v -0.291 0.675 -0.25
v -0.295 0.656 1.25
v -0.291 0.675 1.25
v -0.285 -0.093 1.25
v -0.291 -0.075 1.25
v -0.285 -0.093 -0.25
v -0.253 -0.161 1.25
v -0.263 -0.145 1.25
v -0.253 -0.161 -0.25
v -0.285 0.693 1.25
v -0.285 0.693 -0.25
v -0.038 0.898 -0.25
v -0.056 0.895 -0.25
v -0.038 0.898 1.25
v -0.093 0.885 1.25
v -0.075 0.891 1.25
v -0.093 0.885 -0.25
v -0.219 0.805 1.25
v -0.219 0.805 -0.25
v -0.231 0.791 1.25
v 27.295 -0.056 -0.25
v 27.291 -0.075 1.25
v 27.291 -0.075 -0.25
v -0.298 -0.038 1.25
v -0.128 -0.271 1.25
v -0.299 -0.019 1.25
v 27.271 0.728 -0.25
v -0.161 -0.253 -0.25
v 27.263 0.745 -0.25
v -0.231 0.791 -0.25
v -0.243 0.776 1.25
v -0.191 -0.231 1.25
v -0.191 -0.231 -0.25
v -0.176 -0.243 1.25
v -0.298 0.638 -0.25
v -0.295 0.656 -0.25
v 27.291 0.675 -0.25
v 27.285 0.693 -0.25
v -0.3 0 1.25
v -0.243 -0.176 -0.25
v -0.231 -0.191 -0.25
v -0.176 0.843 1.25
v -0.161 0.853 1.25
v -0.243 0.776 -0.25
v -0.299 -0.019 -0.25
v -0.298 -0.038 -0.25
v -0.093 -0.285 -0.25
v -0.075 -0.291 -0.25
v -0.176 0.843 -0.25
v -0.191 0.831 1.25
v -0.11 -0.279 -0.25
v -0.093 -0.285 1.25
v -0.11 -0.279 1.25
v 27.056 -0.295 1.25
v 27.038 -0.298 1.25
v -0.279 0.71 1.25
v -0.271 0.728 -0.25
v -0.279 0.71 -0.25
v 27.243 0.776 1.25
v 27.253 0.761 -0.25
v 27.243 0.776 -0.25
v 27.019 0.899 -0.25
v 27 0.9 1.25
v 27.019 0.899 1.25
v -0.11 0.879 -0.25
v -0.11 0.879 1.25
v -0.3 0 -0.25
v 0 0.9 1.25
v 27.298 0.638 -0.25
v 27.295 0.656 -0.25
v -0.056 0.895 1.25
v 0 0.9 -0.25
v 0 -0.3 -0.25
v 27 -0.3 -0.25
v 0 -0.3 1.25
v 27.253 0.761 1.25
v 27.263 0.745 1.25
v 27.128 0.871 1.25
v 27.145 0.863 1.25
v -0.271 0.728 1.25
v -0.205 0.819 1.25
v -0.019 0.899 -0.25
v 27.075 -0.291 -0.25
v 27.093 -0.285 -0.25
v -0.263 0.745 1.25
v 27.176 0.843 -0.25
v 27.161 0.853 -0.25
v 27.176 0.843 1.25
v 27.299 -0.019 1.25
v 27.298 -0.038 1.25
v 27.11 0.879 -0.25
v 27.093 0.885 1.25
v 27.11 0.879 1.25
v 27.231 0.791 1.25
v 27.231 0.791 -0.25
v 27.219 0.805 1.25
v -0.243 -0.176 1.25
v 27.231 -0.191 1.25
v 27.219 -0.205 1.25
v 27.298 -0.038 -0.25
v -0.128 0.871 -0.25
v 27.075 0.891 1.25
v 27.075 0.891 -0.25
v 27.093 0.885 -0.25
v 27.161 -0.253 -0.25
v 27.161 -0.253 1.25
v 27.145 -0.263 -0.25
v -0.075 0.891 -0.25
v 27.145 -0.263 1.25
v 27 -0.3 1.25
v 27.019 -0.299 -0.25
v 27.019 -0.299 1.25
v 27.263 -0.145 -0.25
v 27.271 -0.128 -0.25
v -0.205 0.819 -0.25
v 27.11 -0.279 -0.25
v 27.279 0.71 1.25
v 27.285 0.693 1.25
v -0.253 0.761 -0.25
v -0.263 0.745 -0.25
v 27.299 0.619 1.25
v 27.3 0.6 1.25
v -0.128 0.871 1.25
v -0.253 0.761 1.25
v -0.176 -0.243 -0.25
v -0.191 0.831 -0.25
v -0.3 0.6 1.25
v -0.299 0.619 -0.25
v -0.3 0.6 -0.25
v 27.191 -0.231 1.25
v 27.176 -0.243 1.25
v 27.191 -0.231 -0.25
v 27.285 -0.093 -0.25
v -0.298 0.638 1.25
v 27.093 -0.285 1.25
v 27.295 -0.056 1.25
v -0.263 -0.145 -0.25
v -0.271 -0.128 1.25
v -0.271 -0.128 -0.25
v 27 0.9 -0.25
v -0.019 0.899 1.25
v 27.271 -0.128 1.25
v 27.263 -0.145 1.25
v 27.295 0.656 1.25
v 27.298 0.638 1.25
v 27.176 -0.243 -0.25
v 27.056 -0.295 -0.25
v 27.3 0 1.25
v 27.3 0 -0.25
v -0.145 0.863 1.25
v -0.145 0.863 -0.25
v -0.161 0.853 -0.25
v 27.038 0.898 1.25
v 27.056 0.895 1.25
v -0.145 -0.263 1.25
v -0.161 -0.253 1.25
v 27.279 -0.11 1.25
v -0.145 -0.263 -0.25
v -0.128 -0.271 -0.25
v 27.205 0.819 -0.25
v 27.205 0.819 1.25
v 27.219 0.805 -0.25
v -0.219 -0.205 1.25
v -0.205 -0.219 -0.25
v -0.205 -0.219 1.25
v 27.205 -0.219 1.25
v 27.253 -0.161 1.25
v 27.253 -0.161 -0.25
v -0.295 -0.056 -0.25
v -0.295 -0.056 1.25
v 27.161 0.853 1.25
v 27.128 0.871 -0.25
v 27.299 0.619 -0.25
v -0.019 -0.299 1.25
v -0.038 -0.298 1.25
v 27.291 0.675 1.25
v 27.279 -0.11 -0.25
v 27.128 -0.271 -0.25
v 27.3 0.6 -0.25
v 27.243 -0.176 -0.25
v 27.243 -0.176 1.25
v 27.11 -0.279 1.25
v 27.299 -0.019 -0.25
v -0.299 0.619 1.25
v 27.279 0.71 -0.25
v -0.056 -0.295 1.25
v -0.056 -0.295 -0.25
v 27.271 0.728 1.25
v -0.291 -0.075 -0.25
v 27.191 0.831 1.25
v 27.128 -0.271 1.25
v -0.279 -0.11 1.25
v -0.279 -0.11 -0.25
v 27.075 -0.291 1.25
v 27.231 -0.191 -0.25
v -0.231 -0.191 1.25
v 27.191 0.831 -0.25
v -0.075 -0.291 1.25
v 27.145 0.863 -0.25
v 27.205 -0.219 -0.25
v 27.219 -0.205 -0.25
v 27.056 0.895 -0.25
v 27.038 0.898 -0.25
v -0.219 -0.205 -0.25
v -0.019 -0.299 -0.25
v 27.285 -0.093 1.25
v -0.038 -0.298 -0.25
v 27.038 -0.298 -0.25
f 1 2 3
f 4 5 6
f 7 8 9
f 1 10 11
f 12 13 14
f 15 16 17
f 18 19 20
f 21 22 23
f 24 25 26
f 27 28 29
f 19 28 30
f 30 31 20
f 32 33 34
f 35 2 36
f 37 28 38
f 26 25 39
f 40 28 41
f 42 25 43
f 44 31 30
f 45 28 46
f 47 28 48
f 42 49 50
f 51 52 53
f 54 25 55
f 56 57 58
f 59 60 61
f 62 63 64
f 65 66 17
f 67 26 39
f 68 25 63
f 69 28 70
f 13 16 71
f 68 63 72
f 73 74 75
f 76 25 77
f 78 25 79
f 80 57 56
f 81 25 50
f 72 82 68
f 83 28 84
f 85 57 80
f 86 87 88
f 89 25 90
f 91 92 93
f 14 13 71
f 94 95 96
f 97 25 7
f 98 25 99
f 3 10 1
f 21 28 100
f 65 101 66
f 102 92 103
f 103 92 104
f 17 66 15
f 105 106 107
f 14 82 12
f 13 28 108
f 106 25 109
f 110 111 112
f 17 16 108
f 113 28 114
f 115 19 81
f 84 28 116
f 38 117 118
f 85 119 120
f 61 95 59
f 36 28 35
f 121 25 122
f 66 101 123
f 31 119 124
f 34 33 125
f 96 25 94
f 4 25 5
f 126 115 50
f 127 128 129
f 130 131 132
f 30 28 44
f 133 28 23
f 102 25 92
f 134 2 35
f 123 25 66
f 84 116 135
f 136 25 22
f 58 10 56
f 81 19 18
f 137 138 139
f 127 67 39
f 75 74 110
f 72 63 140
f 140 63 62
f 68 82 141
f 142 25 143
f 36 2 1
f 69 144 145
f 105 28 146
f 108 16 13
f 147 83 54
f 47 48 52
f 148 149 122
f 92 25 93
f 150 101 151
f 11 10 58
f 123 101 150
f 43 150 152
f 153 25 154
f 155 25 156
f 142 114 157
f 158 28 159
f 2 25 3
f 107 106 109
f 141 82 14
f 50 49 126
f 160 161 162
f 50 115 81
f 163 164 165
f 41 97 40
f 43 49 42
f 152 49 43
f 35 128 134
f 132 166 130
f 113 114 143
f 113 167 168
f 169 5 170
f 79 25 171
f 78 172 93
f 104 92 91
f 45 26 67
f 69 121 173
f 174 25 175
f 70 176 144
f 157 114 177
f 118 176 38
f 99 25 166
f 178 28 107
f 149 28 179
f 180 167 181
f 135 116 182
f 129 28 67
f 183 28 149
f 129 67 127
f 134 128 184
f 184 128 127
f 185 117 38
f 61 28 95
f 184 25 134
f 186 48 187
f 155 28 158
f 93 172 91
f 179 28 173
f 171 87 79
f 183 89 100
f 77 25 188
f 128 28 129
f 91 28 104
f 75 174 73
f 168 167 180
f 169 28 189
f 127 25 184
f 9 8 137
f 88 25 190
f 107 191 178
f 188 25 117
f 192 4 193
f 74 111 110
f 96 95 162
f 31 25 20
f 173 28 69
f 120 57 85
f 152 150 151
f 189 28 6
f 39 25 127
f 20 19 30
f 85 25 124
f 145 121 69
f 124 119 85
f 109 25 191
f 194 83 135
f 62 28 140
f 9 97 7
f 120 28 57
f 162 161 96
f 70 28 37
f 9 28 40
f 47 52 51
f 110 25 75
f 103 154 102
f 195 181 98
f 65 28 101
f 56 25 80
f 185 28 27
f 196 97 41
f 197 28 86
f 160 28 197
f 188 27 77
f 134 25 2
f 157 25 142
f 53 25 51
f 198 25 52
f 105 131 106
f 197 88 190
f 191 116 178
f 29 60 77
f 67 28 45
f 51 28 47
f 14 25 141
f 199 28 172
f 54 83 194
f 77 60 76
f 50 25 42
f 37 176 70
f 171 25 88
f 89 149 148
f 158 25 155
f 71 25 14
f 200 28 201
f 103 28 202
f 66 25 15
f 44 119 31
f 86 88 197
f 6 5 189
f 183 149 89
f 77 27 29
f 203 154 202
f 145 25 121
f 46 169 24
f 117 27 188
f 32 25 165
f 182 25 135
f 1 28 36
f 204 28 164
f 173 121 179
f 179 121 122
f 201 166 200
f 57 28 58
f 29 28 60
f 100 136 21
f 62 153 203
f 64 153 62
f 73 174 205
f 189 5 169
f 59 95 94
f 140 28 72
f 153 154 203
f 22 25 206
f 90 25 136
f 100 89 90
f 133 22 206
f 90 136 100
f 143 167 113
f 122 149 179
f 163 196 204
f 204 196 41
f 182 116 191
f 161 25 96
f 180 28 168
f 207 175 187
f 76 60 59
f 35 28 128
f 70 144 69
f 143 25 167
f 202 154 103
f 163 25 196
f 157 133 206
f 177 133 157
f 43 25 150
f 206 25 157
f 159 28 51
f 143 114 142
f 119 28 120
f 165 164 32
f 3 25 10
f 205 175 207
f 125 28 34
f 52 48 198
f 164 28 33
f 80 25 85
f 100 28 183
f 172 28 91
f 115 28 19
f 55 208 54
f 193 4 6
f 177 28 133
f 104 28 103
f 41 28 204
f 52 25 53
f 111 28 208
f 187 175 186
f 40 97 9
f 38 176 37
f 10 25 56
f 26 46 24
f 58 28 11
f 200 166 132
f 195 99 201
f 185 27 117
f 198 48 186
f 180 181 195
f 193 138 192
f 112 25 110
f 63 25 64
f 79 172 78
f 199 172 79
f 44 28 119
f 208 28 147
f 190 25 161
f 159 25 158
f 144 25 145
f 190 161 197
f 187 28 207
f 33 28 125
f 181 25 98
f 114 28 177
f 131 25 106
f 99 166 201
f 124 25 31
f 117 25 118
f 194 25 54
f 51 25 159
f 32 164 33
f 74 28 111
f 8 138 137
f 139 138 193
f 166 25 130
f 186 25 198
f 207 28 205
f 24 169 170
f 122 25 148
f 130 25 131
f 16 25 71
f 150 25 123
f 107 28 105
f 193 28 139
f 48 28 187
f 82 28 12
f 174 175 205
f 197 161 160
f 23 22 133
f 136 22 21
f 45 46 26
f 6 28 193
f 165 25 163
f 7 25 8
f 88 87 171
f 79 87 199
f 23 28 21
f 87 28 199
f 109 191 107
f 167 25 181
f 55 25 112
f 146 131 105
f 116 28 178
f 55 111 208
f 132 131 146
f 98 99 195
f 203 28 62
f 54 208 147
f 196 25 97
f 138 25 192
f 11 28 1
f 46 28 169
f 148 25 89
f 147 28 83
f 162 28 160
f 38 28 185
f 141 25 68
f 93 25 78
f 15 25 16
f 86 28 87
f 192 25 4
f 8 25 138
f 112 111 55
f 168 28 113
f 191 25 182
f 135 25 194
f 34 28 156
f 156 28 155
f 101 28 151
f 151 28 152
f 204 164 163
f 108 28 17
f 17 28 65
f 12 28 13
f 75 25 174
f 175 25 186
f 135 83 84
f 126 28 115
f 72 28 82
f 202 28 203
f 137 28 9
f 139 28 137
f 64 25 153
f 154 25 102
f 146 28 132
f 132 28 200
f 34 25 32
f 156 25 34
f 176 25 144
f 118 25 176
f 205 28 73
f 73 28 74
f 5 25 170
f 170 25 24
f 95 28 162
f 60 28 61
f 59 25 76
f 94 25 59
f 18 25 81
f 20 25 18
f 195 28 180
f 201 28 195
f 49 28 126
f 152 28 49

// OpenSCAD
// Andre Betz
// github@AndreBetz.de

BottichDurchmesserDeckel = 350;
BottichDurchmesserBoden  = 322;
BottichHoehe             = 382;
LaeuterblechDicke        = 1;
LaeuterblechWinkel       = 120;
LaeuterblechAuflage      = 120;
SchlitzLaenge            = 27;
SchlitzBreite            = 1.2;
SchlitzAbstandX          = 42;

$fn=100;

module Laeuterbottich(hoehe, d_oben, d_unten)
{
    cylinder(h=hoehe, r1=d_unten/2, r2=d_oben/2, center=false);
}

module Ebene(dicke, breite, winkel,auflage)
{
    wb = ( 180 - winkel ) / 2;
    radius = breite / 2;
    abstand = radius - sqrt(radius*radius - (auflage/2)*(auflage/2));
    translate([-radius+abstand,-breite,0])
        rotate ([0,-wb,0])
            cube([breite*2,breite*2,1],center=false);
}

module BottichSchnitt(hohe,d1,d2,dicke,winkel,auflage)
{
    intersection()
    {
        Ebene( dicke, d2, winkel,auflage);
        Laeuterbottich(hohe,d1,d2);
    }
}

module BlechHalbe(hohe,d1,d2,dicke,winkel,auflage)
{
    difference()
    {
        BottichSchnitt(hohe,d1,d2,dicke,winkel,auflage);
        translate([0,-d1/2,0])
            cube([d1,d1,hohe],center=false);
    }
}

module BlechHalbe3DSpiegeln(hohe,d1,d2,dicke,winkel,auflage)
{
    BlechHalbe(hohe,d1,d2,dicke,winkel,auflage);
    mirror([1,0,0])
        BlechHalbe(hohe,d1,d2,dicke,winkel,auflage);
}

module BlechHalbeFlach(hohe,d1,d2,dicke,winkel,auflage)
{
    wb = ( 180 - winkel ) / 2;
    radius = d2 / 2;
    abstand = radius - sqrt(radius*radius - (auflage/2)*(auflage/2));
    translate([-radius-abstand,0,0])
        rotate([0,wb,0])
            translate([radius-abstand,0,0])
                BlechHalbe(hohe,d1,d2,dicke,winkel,auflage);
}

module BlechHalbe2DSpiegeln(hohe,d1,d2,dicke,winkel,auflage)
{
    BlechHalbeFlach(hohe,d1,d2,dicke,winkel,auflage);
    mirror([1,0,0])
        BlechHalbeFlach(hohe,d1,d2,dicke,winkel,auflage);
}

module Schlitz(laenge,breite,hoehe,posX,posY) 
{
    translate([posX,posY,-hoehe/4])
        minkowski()
        {
            cube([laenge,breite/2,hoehe]);
            cylinder(r=breite/4,hoehe/2);
        }  
}

module SchlitzeXDir(laenge,breite,hoehe,d2,auflage,winkel, abstand)
{
    wb = ( 180 - winkel ) / 2;
    radius = d2 / 2;
    distBoden = sqrt(radius*radius - (auflage/2)*(auflage/2));
    lenC = distBoden / cos(wb);
    count = lenC * 2 / abstand;
    for ( x = [0 : count-1] ) {        
        Schlitz(Laenge,Breite,Hoehe,pX,pY);
    }
}

/*
BlechHalbe2DSpiegeln(
    BottichHoehe,
    BottichDurchmesserDeckel,
    BottichDurchmesserBoden,
    LaeuterblechDicke,
    LaeuterblechWinkel,
    LaeuterblechAuflage);
*/
Schlitz(SchlitzLaenge,SchlitzBreite,LaeuterblechDicke,0,0);


// 2D Projektion fuer SVG Datei
projection() 
{ 
   
}
